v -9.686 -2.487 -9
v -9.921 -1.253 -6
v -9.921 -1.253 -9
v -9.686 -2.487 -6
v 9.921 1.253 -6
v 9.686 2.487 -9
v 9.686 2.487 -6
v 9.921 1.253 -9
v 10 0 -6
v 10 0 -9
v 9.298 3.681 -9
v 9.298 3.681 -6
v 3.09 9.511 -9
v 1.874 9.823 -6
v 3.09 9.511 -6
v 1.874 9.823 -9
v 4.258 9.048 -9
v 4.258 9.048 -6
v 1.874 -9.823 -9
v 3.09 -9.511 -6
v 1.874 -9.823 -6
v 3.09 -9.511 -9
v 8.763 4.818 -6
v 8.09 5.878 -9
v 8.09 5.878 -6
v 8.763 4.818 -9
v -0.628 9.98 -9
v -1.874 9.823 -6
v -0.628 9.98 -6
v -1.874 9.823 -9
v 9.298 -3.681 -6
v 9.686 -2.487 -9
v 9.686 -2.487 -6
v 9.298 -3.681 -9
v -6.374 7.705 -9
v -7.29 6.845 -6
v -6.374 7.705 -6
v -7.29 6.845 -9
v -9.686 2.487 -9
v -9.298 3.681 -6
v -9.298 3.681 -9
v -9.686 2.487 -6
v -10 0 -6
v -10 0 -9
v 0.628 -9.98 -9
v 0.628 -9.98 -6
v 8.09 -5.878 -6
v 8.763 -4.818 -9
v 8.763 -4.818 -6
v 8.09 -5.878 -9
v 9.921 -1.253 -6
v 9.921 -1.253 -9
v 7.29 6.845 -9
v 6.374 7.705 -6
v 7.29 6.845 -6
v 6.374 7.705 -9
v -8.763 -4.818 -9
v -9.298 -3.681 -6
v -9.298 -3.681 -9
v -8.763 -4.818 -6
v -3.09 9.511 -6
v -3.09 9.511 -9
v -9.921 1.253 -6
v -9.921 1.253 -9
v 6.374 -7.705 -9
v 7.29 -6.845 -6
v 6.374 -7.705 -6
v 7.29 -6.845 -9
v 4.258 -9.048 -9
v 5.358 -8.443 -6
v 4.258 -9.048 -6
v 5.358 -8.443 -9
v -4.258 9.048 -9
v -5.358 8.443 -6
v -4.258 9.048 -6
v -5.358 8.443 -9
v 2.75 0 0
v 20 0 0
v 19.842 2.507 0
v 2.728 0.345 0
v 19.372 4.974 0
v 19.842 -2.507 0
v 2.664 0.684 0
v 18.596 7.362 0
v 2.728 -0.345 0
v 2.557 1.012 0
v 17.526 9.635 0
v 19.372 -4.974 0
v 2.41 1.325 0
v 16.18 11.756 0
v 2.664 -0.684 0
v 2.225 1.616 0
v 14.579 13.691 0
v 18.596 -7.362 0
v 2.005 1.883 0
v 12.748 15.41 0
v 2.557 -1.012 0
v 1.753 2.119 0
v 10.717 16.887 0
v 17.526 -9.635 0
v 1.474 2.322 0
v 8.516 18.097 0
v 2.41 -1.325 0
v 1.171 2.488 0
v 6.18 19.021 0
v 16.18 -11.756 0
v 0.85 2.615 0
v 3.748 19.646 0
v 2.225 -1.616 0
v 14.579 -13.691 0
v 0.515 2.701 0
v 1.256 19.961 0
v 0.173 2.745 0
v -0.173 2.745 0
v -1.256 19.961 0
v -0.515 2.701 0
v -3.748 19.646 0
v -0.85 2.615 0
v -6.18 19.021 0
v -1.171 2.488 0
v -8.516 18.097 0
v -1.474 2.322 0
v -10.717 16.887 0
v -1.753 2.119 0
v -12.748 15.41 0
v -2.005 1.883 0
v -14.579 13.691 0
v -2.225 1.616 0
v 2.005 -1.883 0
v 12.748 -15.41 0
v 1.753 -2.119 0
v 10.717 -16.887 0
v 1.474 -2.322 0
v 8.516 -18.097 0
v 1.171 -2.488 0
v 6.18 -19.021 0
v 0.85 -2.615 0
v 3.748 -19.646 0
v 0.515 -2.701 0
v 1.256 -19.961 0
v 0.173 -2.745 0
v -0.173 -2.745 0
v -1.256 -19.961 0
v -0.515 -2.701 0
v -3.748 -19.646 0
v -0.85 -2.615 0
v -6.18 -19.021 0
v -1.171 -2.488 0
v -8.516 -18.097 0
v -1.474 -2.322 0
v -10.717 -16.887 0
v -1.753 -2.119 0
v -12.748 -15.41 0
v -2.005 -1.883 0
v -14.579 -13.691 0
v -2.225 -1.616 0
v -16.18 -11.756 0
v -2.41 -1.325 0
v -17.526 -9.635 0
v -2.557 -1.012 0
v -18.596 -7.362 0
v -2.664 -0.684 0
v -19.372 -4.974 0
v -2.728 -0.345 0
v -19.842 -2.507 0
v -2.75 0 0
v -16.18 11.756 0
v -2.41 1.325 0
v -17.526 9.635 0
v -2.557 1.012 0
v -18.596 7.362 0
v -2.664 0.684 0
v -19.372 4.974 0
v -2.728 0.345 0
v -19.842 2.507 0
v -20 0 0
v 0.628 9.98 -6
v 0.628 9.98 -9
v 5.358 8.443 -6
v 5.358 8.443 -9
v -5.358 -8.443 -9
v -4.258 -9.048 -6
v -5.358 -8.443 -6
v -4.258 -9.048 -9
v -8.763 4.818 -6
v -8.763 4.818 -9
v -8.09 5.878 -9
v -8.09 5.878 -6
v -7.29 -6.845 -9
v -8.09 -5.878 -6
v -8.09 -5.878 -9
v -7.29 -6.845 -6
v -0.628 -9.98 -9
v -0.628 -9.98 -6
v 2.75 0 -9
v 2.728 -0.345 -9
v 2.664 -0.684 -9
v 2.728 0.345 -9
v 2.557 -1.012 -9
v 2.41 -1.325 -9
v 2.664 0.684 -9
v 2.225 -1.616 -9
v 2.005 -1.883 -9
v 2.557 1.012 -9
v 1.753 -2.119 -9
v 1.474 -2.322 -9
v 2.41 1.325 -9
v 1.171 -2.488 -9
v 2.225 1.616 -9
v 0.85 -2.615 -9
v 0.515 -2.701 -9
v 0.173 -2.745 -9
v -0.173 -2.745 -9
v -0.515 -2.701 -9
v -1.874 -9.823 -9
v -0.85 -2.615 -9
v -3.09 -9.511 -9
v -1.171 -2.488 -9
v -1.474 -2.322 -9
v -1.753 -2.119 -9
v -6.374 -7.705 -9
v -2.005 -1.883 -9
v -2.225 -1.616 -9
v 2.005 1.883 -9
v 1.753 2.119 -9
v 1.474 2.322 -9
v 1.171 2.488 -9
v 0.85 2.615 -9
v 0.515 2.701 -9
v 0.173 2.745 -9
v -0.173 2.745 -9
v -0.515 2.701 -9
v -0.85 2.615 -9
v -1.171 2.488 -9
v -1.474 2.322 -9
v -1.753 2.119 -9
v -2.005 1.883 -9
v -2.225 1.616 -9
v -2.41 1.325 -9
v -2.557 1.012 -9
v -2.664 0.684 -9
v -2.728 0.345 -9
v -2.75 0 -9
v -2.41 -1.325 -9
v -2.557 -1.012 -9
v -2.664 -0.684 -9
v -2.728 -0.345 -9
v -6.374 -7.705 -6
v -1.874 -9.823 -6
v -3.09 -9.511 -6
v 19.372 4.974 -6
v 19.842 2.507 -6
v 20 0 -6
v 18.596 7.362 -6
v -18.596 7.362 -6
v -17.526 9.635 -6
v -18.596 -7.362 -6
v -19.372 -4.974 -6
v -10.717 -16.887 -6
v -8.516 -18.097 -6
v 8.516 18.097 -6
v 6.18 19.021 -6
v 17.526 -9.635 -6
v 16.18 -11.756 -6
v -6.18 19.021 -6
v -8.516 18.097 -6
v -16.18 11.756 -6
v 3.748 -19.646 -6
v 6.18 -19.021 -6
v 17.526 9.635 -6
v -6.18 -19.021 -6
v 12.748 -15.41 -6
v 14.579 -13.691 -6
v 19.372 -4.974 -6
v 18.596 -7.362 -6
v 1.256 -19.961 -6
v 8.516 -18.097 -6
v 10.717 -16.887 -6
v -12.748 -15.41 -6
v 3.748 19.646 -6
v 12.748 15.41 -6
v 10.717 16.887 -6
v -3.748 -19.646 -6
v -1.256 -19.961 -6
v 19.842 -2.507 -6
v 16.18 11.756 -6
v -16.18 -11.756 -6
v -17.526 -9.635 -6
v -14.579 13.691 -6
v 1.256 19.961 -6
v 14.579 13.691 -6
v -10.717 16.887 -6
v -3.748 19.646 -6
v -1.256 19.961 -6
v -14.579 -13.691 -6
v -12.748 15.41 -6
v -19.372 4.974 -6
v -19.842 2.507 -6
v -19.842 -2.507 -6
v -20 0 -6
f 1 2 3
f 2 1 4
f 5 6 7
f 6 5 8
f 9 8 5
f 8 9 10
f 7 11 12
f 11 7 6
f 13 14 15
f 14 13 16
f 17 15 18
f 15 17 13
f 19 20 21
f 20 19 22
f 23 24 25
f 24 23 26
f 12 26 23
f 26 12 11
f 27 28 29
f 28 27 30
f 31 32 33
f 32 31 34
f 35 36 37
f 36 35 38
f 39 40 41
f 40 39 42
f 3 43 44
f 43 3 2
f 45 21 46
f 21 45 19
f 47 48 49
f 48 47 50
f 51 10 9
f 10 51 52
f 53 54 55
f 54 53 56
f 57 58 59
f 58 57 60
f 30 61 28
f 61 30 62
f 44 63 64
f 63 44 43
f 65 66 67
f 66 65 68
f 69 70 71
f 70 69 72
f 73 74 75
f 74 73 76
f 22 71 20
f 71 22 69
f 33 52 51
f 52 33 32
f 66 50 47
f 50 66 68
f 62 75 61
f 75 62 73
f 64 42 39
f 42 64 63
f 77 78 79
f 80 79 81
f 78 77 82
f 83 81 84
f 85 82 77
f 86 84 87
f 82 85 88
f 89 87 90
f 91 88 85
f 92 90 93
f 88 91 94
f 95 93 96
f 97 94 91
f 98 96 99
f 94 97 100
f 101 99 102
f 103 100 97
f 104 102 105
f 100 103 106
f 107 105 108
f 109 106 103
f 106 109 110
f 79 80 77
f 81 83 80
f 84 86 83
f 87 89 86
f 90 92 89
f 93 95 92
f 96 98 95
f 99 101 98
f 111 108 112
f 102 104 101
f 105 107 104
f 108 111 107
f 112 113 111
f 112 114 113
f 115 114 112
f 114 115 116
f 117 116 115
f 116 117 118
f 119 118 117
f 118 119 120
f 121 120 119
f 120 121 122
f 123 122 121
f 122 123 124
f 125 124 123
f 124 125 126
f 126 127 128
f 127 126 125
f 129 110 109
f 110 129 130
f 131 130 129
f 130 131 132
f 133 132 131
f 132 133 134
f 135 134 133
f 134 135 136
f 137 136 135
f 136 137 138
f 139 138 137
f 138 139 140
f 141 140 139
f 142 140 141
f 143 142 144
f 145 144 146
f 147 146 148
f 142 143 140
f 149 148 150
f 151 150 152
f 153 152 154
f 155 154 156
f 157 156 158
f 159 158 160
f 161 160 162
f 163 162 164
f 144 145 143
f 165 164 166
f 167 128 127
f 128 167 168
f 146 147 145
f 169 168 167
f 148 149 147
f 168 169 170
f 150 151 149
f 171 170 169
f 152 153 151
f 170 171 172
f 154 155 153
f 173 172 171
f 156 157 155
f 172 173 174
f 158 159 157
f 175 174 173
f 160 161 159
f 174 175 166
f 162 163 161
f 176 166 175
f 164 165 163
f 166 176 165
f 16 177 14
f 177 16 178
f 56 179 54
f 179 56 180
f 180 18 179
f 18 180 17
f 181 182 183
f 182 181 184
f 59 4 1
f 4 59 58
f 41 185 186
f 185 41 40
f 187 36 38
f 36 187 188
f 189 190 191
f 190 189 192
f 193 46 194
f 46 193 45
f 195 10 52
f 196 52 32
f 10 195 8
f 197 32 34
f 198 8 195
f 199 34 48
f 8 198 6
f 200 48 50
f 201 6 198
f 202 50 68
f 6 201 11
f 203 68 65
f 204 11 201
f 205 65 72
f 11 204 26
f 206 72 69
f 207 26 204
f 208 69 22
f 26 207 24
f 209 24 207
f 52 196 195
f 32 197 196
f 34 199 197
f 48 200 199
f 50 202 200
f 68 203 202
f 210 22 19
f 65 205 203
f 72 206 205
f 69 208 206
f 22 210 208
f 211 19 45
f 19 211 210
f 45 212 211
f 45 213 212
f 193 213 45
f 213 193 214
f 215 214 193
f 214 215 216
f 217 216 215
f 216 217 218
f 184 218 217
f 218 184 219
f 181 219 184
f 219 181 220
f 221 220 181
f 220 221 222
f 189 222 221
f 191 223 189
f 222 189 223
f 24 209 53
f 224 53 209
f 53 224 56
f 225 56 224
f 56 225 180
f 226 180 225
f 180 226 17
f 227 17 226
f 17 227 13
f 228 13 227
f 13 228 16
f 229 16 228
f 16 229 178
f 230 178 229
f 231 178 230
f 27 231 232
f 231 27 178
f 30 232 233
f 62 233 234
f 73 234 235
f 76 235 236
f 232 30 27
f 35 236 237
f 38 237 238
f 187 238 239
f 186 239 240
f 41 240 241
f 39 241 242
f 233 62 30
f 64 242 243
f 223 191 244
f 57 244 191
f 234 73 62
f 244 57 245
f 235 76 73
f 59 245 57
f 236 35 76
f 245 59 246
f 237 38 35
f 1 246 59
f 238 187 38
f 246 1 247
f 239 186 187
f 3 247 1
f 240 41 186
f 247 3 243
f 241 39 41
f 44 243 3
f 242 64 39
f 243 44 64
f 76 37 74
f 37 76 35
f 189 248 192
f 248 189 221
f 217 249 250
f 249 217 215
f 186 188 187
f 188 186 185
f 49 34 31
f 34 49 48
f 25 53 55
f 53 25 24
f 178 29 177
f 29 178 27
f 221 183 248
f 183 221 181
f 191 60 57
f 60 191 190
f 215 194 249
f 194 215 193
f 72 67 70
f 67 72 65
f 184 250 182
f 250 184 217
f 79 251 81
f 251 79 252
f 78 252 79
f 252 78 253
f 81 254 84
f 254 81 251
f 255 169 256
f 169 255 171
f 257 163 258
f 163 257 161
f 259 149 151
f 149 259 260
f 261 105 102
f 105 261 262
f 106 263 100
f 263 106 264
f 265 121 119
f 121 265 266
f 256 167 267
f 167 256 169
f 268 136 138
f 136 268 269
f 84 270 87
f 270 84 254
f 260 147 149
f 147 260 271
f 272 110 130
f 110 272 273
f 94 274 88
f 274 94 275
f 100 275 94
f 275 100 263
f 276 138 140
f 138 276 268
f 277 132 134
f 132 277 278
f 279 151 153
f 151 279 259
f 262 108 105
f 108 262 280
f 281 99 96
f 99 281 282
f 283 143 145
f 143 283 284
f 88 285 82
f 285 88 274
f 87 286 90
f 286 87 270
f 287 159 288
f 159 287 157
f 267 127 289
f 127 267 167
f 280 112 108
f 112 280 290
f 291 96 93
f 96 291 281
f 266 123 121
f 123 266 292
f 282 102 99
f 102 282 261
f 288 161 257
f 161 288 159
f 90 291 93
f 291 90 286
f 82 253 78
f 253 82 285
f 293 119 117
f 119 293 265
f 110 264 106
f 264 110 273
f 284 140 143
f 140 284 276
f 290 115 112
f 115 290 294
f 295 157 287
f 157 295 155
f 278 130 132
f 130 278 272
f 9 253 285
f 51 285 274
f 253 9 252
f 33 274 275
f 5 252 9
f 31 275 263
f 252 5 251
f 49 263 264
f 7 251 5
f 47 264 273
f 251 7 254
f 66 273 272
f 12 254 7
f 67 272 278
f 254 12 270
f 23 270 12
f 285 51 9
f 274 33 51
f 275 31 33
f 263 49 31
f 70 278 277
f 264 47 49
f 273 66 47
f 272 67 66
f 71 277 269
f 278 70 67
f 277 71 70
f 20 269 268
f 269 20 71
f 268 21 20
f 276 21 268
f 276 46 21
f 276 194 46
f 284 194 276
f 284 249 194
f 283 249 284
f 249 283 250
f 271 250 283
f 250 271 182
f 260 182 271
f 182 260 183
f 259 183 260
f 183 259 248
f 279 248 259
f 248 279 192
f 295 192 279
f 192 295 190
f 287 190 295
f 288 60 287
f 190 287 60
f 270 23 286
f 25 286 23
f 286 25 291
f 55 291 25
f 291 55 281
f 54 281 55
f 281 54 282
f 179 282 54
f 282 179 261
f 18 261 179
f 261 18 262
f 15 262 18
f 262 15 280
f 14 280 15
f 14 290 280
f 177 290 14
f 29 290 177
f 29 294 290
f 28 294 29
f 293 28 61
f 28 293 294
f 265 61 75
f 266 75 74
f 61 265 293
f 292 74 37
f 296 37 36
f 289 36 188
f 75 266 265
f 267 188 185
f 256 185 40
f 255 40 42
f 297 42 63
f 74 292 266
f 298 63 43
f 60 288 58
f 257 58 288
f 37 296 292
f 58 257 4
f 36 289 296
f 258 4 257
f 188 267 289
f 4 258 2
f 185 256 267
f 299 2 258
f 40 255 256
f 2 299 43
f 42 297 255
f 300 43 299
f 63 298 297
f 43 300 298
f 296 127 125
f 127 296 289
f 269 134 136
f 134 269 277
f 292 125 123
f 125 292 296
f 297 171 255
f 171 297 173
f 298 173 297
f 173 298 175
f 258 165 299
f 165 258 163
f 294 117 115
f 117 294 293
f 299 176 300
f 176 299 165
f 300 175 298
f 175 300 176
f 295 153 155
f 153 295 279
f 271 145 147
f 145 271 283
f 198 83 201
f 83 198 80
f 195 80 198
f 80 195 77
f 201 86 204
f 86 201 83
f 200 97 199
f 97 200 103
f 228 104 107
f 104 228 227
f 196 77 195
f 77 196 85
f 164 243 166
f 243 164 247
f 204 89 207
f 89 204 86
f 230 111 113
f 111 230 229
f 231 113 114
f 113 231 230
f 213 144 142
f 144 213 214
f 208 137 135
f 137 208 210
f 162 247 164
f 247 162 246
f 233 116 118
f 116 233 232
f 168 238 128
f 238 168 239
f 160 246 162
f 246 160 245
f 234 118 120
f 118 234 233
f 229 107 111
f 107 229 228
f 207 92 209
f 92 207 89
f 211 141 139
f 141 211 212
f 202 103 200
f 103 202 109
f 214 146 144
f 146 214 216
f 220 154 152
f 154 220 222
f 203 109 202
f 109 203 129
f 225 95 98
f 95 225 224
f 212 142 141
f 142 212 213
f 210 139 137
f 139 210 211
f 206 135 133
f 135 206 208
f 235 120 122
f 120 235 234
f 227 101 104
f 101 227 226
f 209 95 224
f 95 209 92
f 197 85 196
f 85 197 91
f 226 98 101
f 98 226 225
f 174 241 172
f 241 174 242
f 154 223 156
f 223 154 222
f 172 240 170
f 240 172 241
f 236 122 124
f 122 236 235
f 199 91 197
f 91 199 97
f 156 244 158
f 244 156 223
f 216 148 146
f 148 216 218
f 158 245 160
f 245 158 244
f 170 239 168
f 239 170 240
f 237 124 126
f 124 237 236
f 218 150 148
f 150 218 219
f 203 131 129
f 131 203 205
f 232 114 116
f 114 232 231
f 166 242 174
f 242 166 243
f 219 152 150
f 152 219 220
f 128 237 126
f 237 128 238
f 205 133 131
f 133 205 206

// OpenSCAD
$fn = 50;


difference() {
	union() {
		translate(v = [0, 0, -9.0000000000]) {
			cylinder(h = 9, r = 10.0000000000);
		}
		translate(v = [0, 0, -6.0000000000]) {
			cylinder(h = 6, r = 20.0000000000);
		}
	}
	union() {
		#translate(v = [0, 0, -9]) {
			cylinder(h = 9, r = 2.7500000000);
		}
	}
}
